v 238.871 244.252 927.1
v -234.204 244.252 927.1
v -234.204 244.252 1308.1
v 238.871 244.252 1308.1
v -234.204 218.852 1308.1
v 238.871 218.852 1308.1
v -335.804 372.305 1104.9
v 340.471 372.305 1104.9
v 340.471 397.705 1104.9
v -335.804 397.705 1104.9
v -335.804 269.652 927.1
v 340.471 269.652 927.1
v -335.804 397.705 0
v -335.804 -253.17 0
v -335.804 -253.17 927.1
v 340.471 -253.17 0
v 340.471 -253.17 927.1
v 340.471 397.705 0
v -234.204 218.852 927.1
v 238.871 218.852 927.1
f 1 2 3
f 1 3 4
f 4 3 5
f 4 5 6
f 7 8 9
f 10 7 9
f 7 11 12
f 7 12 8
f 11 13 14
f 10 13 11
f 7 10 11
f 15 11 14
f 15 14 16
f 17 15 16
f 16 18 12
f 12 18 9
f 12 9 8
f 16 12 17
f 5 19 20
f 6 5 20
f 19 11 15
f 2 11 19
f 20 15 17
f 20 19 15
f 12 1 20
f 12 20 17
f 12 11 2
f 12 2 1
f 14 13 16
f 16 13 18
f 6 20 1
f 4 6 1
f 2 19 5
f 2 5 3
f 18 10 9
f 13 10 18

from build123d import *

# Parameters (mm, degrees)
F0_W     = 676.275
F0_H     = 650.875
F1_DEPTH = 927.1
F3_DEPTH = 676.275
F4_W     = 473.075
F4_H     = 25.4
F5_DEPTH = 381


with BuildPart() as f1:
    # F0 (on Top) → F1 (new body)
    with BuildSketch(Plane.XY):
        with Locations((2.333625, 72.26744)):
            Rectangle(F0_W, F0_H)
    extrude(amount=F1_DEPTH)

    # F2 (on face) → F3 (join, through all)
    with BuildSketch(Plane(origin=(-335.803875, 0, 0), x_dir=(0, -1, 0), z_dir=(-1, 0, 0))):
        Polygon((-397.70494, 1104.9), (-397.70494, 927.1), (-269.652062, 927.1), (-372.30494, 1104.9), align=None)
    extrude(amount=-F3_DEPTH)

    # F4 (on face) → F5 (join)
    with BuildSketch(Plane.XY.offset(927.1)):
        with Locations((2.333625, 231.552062)):
            Rectangle(F4_W, F4_H)
    extrude(amount=F5_DEPTH)


solid = f1.part
